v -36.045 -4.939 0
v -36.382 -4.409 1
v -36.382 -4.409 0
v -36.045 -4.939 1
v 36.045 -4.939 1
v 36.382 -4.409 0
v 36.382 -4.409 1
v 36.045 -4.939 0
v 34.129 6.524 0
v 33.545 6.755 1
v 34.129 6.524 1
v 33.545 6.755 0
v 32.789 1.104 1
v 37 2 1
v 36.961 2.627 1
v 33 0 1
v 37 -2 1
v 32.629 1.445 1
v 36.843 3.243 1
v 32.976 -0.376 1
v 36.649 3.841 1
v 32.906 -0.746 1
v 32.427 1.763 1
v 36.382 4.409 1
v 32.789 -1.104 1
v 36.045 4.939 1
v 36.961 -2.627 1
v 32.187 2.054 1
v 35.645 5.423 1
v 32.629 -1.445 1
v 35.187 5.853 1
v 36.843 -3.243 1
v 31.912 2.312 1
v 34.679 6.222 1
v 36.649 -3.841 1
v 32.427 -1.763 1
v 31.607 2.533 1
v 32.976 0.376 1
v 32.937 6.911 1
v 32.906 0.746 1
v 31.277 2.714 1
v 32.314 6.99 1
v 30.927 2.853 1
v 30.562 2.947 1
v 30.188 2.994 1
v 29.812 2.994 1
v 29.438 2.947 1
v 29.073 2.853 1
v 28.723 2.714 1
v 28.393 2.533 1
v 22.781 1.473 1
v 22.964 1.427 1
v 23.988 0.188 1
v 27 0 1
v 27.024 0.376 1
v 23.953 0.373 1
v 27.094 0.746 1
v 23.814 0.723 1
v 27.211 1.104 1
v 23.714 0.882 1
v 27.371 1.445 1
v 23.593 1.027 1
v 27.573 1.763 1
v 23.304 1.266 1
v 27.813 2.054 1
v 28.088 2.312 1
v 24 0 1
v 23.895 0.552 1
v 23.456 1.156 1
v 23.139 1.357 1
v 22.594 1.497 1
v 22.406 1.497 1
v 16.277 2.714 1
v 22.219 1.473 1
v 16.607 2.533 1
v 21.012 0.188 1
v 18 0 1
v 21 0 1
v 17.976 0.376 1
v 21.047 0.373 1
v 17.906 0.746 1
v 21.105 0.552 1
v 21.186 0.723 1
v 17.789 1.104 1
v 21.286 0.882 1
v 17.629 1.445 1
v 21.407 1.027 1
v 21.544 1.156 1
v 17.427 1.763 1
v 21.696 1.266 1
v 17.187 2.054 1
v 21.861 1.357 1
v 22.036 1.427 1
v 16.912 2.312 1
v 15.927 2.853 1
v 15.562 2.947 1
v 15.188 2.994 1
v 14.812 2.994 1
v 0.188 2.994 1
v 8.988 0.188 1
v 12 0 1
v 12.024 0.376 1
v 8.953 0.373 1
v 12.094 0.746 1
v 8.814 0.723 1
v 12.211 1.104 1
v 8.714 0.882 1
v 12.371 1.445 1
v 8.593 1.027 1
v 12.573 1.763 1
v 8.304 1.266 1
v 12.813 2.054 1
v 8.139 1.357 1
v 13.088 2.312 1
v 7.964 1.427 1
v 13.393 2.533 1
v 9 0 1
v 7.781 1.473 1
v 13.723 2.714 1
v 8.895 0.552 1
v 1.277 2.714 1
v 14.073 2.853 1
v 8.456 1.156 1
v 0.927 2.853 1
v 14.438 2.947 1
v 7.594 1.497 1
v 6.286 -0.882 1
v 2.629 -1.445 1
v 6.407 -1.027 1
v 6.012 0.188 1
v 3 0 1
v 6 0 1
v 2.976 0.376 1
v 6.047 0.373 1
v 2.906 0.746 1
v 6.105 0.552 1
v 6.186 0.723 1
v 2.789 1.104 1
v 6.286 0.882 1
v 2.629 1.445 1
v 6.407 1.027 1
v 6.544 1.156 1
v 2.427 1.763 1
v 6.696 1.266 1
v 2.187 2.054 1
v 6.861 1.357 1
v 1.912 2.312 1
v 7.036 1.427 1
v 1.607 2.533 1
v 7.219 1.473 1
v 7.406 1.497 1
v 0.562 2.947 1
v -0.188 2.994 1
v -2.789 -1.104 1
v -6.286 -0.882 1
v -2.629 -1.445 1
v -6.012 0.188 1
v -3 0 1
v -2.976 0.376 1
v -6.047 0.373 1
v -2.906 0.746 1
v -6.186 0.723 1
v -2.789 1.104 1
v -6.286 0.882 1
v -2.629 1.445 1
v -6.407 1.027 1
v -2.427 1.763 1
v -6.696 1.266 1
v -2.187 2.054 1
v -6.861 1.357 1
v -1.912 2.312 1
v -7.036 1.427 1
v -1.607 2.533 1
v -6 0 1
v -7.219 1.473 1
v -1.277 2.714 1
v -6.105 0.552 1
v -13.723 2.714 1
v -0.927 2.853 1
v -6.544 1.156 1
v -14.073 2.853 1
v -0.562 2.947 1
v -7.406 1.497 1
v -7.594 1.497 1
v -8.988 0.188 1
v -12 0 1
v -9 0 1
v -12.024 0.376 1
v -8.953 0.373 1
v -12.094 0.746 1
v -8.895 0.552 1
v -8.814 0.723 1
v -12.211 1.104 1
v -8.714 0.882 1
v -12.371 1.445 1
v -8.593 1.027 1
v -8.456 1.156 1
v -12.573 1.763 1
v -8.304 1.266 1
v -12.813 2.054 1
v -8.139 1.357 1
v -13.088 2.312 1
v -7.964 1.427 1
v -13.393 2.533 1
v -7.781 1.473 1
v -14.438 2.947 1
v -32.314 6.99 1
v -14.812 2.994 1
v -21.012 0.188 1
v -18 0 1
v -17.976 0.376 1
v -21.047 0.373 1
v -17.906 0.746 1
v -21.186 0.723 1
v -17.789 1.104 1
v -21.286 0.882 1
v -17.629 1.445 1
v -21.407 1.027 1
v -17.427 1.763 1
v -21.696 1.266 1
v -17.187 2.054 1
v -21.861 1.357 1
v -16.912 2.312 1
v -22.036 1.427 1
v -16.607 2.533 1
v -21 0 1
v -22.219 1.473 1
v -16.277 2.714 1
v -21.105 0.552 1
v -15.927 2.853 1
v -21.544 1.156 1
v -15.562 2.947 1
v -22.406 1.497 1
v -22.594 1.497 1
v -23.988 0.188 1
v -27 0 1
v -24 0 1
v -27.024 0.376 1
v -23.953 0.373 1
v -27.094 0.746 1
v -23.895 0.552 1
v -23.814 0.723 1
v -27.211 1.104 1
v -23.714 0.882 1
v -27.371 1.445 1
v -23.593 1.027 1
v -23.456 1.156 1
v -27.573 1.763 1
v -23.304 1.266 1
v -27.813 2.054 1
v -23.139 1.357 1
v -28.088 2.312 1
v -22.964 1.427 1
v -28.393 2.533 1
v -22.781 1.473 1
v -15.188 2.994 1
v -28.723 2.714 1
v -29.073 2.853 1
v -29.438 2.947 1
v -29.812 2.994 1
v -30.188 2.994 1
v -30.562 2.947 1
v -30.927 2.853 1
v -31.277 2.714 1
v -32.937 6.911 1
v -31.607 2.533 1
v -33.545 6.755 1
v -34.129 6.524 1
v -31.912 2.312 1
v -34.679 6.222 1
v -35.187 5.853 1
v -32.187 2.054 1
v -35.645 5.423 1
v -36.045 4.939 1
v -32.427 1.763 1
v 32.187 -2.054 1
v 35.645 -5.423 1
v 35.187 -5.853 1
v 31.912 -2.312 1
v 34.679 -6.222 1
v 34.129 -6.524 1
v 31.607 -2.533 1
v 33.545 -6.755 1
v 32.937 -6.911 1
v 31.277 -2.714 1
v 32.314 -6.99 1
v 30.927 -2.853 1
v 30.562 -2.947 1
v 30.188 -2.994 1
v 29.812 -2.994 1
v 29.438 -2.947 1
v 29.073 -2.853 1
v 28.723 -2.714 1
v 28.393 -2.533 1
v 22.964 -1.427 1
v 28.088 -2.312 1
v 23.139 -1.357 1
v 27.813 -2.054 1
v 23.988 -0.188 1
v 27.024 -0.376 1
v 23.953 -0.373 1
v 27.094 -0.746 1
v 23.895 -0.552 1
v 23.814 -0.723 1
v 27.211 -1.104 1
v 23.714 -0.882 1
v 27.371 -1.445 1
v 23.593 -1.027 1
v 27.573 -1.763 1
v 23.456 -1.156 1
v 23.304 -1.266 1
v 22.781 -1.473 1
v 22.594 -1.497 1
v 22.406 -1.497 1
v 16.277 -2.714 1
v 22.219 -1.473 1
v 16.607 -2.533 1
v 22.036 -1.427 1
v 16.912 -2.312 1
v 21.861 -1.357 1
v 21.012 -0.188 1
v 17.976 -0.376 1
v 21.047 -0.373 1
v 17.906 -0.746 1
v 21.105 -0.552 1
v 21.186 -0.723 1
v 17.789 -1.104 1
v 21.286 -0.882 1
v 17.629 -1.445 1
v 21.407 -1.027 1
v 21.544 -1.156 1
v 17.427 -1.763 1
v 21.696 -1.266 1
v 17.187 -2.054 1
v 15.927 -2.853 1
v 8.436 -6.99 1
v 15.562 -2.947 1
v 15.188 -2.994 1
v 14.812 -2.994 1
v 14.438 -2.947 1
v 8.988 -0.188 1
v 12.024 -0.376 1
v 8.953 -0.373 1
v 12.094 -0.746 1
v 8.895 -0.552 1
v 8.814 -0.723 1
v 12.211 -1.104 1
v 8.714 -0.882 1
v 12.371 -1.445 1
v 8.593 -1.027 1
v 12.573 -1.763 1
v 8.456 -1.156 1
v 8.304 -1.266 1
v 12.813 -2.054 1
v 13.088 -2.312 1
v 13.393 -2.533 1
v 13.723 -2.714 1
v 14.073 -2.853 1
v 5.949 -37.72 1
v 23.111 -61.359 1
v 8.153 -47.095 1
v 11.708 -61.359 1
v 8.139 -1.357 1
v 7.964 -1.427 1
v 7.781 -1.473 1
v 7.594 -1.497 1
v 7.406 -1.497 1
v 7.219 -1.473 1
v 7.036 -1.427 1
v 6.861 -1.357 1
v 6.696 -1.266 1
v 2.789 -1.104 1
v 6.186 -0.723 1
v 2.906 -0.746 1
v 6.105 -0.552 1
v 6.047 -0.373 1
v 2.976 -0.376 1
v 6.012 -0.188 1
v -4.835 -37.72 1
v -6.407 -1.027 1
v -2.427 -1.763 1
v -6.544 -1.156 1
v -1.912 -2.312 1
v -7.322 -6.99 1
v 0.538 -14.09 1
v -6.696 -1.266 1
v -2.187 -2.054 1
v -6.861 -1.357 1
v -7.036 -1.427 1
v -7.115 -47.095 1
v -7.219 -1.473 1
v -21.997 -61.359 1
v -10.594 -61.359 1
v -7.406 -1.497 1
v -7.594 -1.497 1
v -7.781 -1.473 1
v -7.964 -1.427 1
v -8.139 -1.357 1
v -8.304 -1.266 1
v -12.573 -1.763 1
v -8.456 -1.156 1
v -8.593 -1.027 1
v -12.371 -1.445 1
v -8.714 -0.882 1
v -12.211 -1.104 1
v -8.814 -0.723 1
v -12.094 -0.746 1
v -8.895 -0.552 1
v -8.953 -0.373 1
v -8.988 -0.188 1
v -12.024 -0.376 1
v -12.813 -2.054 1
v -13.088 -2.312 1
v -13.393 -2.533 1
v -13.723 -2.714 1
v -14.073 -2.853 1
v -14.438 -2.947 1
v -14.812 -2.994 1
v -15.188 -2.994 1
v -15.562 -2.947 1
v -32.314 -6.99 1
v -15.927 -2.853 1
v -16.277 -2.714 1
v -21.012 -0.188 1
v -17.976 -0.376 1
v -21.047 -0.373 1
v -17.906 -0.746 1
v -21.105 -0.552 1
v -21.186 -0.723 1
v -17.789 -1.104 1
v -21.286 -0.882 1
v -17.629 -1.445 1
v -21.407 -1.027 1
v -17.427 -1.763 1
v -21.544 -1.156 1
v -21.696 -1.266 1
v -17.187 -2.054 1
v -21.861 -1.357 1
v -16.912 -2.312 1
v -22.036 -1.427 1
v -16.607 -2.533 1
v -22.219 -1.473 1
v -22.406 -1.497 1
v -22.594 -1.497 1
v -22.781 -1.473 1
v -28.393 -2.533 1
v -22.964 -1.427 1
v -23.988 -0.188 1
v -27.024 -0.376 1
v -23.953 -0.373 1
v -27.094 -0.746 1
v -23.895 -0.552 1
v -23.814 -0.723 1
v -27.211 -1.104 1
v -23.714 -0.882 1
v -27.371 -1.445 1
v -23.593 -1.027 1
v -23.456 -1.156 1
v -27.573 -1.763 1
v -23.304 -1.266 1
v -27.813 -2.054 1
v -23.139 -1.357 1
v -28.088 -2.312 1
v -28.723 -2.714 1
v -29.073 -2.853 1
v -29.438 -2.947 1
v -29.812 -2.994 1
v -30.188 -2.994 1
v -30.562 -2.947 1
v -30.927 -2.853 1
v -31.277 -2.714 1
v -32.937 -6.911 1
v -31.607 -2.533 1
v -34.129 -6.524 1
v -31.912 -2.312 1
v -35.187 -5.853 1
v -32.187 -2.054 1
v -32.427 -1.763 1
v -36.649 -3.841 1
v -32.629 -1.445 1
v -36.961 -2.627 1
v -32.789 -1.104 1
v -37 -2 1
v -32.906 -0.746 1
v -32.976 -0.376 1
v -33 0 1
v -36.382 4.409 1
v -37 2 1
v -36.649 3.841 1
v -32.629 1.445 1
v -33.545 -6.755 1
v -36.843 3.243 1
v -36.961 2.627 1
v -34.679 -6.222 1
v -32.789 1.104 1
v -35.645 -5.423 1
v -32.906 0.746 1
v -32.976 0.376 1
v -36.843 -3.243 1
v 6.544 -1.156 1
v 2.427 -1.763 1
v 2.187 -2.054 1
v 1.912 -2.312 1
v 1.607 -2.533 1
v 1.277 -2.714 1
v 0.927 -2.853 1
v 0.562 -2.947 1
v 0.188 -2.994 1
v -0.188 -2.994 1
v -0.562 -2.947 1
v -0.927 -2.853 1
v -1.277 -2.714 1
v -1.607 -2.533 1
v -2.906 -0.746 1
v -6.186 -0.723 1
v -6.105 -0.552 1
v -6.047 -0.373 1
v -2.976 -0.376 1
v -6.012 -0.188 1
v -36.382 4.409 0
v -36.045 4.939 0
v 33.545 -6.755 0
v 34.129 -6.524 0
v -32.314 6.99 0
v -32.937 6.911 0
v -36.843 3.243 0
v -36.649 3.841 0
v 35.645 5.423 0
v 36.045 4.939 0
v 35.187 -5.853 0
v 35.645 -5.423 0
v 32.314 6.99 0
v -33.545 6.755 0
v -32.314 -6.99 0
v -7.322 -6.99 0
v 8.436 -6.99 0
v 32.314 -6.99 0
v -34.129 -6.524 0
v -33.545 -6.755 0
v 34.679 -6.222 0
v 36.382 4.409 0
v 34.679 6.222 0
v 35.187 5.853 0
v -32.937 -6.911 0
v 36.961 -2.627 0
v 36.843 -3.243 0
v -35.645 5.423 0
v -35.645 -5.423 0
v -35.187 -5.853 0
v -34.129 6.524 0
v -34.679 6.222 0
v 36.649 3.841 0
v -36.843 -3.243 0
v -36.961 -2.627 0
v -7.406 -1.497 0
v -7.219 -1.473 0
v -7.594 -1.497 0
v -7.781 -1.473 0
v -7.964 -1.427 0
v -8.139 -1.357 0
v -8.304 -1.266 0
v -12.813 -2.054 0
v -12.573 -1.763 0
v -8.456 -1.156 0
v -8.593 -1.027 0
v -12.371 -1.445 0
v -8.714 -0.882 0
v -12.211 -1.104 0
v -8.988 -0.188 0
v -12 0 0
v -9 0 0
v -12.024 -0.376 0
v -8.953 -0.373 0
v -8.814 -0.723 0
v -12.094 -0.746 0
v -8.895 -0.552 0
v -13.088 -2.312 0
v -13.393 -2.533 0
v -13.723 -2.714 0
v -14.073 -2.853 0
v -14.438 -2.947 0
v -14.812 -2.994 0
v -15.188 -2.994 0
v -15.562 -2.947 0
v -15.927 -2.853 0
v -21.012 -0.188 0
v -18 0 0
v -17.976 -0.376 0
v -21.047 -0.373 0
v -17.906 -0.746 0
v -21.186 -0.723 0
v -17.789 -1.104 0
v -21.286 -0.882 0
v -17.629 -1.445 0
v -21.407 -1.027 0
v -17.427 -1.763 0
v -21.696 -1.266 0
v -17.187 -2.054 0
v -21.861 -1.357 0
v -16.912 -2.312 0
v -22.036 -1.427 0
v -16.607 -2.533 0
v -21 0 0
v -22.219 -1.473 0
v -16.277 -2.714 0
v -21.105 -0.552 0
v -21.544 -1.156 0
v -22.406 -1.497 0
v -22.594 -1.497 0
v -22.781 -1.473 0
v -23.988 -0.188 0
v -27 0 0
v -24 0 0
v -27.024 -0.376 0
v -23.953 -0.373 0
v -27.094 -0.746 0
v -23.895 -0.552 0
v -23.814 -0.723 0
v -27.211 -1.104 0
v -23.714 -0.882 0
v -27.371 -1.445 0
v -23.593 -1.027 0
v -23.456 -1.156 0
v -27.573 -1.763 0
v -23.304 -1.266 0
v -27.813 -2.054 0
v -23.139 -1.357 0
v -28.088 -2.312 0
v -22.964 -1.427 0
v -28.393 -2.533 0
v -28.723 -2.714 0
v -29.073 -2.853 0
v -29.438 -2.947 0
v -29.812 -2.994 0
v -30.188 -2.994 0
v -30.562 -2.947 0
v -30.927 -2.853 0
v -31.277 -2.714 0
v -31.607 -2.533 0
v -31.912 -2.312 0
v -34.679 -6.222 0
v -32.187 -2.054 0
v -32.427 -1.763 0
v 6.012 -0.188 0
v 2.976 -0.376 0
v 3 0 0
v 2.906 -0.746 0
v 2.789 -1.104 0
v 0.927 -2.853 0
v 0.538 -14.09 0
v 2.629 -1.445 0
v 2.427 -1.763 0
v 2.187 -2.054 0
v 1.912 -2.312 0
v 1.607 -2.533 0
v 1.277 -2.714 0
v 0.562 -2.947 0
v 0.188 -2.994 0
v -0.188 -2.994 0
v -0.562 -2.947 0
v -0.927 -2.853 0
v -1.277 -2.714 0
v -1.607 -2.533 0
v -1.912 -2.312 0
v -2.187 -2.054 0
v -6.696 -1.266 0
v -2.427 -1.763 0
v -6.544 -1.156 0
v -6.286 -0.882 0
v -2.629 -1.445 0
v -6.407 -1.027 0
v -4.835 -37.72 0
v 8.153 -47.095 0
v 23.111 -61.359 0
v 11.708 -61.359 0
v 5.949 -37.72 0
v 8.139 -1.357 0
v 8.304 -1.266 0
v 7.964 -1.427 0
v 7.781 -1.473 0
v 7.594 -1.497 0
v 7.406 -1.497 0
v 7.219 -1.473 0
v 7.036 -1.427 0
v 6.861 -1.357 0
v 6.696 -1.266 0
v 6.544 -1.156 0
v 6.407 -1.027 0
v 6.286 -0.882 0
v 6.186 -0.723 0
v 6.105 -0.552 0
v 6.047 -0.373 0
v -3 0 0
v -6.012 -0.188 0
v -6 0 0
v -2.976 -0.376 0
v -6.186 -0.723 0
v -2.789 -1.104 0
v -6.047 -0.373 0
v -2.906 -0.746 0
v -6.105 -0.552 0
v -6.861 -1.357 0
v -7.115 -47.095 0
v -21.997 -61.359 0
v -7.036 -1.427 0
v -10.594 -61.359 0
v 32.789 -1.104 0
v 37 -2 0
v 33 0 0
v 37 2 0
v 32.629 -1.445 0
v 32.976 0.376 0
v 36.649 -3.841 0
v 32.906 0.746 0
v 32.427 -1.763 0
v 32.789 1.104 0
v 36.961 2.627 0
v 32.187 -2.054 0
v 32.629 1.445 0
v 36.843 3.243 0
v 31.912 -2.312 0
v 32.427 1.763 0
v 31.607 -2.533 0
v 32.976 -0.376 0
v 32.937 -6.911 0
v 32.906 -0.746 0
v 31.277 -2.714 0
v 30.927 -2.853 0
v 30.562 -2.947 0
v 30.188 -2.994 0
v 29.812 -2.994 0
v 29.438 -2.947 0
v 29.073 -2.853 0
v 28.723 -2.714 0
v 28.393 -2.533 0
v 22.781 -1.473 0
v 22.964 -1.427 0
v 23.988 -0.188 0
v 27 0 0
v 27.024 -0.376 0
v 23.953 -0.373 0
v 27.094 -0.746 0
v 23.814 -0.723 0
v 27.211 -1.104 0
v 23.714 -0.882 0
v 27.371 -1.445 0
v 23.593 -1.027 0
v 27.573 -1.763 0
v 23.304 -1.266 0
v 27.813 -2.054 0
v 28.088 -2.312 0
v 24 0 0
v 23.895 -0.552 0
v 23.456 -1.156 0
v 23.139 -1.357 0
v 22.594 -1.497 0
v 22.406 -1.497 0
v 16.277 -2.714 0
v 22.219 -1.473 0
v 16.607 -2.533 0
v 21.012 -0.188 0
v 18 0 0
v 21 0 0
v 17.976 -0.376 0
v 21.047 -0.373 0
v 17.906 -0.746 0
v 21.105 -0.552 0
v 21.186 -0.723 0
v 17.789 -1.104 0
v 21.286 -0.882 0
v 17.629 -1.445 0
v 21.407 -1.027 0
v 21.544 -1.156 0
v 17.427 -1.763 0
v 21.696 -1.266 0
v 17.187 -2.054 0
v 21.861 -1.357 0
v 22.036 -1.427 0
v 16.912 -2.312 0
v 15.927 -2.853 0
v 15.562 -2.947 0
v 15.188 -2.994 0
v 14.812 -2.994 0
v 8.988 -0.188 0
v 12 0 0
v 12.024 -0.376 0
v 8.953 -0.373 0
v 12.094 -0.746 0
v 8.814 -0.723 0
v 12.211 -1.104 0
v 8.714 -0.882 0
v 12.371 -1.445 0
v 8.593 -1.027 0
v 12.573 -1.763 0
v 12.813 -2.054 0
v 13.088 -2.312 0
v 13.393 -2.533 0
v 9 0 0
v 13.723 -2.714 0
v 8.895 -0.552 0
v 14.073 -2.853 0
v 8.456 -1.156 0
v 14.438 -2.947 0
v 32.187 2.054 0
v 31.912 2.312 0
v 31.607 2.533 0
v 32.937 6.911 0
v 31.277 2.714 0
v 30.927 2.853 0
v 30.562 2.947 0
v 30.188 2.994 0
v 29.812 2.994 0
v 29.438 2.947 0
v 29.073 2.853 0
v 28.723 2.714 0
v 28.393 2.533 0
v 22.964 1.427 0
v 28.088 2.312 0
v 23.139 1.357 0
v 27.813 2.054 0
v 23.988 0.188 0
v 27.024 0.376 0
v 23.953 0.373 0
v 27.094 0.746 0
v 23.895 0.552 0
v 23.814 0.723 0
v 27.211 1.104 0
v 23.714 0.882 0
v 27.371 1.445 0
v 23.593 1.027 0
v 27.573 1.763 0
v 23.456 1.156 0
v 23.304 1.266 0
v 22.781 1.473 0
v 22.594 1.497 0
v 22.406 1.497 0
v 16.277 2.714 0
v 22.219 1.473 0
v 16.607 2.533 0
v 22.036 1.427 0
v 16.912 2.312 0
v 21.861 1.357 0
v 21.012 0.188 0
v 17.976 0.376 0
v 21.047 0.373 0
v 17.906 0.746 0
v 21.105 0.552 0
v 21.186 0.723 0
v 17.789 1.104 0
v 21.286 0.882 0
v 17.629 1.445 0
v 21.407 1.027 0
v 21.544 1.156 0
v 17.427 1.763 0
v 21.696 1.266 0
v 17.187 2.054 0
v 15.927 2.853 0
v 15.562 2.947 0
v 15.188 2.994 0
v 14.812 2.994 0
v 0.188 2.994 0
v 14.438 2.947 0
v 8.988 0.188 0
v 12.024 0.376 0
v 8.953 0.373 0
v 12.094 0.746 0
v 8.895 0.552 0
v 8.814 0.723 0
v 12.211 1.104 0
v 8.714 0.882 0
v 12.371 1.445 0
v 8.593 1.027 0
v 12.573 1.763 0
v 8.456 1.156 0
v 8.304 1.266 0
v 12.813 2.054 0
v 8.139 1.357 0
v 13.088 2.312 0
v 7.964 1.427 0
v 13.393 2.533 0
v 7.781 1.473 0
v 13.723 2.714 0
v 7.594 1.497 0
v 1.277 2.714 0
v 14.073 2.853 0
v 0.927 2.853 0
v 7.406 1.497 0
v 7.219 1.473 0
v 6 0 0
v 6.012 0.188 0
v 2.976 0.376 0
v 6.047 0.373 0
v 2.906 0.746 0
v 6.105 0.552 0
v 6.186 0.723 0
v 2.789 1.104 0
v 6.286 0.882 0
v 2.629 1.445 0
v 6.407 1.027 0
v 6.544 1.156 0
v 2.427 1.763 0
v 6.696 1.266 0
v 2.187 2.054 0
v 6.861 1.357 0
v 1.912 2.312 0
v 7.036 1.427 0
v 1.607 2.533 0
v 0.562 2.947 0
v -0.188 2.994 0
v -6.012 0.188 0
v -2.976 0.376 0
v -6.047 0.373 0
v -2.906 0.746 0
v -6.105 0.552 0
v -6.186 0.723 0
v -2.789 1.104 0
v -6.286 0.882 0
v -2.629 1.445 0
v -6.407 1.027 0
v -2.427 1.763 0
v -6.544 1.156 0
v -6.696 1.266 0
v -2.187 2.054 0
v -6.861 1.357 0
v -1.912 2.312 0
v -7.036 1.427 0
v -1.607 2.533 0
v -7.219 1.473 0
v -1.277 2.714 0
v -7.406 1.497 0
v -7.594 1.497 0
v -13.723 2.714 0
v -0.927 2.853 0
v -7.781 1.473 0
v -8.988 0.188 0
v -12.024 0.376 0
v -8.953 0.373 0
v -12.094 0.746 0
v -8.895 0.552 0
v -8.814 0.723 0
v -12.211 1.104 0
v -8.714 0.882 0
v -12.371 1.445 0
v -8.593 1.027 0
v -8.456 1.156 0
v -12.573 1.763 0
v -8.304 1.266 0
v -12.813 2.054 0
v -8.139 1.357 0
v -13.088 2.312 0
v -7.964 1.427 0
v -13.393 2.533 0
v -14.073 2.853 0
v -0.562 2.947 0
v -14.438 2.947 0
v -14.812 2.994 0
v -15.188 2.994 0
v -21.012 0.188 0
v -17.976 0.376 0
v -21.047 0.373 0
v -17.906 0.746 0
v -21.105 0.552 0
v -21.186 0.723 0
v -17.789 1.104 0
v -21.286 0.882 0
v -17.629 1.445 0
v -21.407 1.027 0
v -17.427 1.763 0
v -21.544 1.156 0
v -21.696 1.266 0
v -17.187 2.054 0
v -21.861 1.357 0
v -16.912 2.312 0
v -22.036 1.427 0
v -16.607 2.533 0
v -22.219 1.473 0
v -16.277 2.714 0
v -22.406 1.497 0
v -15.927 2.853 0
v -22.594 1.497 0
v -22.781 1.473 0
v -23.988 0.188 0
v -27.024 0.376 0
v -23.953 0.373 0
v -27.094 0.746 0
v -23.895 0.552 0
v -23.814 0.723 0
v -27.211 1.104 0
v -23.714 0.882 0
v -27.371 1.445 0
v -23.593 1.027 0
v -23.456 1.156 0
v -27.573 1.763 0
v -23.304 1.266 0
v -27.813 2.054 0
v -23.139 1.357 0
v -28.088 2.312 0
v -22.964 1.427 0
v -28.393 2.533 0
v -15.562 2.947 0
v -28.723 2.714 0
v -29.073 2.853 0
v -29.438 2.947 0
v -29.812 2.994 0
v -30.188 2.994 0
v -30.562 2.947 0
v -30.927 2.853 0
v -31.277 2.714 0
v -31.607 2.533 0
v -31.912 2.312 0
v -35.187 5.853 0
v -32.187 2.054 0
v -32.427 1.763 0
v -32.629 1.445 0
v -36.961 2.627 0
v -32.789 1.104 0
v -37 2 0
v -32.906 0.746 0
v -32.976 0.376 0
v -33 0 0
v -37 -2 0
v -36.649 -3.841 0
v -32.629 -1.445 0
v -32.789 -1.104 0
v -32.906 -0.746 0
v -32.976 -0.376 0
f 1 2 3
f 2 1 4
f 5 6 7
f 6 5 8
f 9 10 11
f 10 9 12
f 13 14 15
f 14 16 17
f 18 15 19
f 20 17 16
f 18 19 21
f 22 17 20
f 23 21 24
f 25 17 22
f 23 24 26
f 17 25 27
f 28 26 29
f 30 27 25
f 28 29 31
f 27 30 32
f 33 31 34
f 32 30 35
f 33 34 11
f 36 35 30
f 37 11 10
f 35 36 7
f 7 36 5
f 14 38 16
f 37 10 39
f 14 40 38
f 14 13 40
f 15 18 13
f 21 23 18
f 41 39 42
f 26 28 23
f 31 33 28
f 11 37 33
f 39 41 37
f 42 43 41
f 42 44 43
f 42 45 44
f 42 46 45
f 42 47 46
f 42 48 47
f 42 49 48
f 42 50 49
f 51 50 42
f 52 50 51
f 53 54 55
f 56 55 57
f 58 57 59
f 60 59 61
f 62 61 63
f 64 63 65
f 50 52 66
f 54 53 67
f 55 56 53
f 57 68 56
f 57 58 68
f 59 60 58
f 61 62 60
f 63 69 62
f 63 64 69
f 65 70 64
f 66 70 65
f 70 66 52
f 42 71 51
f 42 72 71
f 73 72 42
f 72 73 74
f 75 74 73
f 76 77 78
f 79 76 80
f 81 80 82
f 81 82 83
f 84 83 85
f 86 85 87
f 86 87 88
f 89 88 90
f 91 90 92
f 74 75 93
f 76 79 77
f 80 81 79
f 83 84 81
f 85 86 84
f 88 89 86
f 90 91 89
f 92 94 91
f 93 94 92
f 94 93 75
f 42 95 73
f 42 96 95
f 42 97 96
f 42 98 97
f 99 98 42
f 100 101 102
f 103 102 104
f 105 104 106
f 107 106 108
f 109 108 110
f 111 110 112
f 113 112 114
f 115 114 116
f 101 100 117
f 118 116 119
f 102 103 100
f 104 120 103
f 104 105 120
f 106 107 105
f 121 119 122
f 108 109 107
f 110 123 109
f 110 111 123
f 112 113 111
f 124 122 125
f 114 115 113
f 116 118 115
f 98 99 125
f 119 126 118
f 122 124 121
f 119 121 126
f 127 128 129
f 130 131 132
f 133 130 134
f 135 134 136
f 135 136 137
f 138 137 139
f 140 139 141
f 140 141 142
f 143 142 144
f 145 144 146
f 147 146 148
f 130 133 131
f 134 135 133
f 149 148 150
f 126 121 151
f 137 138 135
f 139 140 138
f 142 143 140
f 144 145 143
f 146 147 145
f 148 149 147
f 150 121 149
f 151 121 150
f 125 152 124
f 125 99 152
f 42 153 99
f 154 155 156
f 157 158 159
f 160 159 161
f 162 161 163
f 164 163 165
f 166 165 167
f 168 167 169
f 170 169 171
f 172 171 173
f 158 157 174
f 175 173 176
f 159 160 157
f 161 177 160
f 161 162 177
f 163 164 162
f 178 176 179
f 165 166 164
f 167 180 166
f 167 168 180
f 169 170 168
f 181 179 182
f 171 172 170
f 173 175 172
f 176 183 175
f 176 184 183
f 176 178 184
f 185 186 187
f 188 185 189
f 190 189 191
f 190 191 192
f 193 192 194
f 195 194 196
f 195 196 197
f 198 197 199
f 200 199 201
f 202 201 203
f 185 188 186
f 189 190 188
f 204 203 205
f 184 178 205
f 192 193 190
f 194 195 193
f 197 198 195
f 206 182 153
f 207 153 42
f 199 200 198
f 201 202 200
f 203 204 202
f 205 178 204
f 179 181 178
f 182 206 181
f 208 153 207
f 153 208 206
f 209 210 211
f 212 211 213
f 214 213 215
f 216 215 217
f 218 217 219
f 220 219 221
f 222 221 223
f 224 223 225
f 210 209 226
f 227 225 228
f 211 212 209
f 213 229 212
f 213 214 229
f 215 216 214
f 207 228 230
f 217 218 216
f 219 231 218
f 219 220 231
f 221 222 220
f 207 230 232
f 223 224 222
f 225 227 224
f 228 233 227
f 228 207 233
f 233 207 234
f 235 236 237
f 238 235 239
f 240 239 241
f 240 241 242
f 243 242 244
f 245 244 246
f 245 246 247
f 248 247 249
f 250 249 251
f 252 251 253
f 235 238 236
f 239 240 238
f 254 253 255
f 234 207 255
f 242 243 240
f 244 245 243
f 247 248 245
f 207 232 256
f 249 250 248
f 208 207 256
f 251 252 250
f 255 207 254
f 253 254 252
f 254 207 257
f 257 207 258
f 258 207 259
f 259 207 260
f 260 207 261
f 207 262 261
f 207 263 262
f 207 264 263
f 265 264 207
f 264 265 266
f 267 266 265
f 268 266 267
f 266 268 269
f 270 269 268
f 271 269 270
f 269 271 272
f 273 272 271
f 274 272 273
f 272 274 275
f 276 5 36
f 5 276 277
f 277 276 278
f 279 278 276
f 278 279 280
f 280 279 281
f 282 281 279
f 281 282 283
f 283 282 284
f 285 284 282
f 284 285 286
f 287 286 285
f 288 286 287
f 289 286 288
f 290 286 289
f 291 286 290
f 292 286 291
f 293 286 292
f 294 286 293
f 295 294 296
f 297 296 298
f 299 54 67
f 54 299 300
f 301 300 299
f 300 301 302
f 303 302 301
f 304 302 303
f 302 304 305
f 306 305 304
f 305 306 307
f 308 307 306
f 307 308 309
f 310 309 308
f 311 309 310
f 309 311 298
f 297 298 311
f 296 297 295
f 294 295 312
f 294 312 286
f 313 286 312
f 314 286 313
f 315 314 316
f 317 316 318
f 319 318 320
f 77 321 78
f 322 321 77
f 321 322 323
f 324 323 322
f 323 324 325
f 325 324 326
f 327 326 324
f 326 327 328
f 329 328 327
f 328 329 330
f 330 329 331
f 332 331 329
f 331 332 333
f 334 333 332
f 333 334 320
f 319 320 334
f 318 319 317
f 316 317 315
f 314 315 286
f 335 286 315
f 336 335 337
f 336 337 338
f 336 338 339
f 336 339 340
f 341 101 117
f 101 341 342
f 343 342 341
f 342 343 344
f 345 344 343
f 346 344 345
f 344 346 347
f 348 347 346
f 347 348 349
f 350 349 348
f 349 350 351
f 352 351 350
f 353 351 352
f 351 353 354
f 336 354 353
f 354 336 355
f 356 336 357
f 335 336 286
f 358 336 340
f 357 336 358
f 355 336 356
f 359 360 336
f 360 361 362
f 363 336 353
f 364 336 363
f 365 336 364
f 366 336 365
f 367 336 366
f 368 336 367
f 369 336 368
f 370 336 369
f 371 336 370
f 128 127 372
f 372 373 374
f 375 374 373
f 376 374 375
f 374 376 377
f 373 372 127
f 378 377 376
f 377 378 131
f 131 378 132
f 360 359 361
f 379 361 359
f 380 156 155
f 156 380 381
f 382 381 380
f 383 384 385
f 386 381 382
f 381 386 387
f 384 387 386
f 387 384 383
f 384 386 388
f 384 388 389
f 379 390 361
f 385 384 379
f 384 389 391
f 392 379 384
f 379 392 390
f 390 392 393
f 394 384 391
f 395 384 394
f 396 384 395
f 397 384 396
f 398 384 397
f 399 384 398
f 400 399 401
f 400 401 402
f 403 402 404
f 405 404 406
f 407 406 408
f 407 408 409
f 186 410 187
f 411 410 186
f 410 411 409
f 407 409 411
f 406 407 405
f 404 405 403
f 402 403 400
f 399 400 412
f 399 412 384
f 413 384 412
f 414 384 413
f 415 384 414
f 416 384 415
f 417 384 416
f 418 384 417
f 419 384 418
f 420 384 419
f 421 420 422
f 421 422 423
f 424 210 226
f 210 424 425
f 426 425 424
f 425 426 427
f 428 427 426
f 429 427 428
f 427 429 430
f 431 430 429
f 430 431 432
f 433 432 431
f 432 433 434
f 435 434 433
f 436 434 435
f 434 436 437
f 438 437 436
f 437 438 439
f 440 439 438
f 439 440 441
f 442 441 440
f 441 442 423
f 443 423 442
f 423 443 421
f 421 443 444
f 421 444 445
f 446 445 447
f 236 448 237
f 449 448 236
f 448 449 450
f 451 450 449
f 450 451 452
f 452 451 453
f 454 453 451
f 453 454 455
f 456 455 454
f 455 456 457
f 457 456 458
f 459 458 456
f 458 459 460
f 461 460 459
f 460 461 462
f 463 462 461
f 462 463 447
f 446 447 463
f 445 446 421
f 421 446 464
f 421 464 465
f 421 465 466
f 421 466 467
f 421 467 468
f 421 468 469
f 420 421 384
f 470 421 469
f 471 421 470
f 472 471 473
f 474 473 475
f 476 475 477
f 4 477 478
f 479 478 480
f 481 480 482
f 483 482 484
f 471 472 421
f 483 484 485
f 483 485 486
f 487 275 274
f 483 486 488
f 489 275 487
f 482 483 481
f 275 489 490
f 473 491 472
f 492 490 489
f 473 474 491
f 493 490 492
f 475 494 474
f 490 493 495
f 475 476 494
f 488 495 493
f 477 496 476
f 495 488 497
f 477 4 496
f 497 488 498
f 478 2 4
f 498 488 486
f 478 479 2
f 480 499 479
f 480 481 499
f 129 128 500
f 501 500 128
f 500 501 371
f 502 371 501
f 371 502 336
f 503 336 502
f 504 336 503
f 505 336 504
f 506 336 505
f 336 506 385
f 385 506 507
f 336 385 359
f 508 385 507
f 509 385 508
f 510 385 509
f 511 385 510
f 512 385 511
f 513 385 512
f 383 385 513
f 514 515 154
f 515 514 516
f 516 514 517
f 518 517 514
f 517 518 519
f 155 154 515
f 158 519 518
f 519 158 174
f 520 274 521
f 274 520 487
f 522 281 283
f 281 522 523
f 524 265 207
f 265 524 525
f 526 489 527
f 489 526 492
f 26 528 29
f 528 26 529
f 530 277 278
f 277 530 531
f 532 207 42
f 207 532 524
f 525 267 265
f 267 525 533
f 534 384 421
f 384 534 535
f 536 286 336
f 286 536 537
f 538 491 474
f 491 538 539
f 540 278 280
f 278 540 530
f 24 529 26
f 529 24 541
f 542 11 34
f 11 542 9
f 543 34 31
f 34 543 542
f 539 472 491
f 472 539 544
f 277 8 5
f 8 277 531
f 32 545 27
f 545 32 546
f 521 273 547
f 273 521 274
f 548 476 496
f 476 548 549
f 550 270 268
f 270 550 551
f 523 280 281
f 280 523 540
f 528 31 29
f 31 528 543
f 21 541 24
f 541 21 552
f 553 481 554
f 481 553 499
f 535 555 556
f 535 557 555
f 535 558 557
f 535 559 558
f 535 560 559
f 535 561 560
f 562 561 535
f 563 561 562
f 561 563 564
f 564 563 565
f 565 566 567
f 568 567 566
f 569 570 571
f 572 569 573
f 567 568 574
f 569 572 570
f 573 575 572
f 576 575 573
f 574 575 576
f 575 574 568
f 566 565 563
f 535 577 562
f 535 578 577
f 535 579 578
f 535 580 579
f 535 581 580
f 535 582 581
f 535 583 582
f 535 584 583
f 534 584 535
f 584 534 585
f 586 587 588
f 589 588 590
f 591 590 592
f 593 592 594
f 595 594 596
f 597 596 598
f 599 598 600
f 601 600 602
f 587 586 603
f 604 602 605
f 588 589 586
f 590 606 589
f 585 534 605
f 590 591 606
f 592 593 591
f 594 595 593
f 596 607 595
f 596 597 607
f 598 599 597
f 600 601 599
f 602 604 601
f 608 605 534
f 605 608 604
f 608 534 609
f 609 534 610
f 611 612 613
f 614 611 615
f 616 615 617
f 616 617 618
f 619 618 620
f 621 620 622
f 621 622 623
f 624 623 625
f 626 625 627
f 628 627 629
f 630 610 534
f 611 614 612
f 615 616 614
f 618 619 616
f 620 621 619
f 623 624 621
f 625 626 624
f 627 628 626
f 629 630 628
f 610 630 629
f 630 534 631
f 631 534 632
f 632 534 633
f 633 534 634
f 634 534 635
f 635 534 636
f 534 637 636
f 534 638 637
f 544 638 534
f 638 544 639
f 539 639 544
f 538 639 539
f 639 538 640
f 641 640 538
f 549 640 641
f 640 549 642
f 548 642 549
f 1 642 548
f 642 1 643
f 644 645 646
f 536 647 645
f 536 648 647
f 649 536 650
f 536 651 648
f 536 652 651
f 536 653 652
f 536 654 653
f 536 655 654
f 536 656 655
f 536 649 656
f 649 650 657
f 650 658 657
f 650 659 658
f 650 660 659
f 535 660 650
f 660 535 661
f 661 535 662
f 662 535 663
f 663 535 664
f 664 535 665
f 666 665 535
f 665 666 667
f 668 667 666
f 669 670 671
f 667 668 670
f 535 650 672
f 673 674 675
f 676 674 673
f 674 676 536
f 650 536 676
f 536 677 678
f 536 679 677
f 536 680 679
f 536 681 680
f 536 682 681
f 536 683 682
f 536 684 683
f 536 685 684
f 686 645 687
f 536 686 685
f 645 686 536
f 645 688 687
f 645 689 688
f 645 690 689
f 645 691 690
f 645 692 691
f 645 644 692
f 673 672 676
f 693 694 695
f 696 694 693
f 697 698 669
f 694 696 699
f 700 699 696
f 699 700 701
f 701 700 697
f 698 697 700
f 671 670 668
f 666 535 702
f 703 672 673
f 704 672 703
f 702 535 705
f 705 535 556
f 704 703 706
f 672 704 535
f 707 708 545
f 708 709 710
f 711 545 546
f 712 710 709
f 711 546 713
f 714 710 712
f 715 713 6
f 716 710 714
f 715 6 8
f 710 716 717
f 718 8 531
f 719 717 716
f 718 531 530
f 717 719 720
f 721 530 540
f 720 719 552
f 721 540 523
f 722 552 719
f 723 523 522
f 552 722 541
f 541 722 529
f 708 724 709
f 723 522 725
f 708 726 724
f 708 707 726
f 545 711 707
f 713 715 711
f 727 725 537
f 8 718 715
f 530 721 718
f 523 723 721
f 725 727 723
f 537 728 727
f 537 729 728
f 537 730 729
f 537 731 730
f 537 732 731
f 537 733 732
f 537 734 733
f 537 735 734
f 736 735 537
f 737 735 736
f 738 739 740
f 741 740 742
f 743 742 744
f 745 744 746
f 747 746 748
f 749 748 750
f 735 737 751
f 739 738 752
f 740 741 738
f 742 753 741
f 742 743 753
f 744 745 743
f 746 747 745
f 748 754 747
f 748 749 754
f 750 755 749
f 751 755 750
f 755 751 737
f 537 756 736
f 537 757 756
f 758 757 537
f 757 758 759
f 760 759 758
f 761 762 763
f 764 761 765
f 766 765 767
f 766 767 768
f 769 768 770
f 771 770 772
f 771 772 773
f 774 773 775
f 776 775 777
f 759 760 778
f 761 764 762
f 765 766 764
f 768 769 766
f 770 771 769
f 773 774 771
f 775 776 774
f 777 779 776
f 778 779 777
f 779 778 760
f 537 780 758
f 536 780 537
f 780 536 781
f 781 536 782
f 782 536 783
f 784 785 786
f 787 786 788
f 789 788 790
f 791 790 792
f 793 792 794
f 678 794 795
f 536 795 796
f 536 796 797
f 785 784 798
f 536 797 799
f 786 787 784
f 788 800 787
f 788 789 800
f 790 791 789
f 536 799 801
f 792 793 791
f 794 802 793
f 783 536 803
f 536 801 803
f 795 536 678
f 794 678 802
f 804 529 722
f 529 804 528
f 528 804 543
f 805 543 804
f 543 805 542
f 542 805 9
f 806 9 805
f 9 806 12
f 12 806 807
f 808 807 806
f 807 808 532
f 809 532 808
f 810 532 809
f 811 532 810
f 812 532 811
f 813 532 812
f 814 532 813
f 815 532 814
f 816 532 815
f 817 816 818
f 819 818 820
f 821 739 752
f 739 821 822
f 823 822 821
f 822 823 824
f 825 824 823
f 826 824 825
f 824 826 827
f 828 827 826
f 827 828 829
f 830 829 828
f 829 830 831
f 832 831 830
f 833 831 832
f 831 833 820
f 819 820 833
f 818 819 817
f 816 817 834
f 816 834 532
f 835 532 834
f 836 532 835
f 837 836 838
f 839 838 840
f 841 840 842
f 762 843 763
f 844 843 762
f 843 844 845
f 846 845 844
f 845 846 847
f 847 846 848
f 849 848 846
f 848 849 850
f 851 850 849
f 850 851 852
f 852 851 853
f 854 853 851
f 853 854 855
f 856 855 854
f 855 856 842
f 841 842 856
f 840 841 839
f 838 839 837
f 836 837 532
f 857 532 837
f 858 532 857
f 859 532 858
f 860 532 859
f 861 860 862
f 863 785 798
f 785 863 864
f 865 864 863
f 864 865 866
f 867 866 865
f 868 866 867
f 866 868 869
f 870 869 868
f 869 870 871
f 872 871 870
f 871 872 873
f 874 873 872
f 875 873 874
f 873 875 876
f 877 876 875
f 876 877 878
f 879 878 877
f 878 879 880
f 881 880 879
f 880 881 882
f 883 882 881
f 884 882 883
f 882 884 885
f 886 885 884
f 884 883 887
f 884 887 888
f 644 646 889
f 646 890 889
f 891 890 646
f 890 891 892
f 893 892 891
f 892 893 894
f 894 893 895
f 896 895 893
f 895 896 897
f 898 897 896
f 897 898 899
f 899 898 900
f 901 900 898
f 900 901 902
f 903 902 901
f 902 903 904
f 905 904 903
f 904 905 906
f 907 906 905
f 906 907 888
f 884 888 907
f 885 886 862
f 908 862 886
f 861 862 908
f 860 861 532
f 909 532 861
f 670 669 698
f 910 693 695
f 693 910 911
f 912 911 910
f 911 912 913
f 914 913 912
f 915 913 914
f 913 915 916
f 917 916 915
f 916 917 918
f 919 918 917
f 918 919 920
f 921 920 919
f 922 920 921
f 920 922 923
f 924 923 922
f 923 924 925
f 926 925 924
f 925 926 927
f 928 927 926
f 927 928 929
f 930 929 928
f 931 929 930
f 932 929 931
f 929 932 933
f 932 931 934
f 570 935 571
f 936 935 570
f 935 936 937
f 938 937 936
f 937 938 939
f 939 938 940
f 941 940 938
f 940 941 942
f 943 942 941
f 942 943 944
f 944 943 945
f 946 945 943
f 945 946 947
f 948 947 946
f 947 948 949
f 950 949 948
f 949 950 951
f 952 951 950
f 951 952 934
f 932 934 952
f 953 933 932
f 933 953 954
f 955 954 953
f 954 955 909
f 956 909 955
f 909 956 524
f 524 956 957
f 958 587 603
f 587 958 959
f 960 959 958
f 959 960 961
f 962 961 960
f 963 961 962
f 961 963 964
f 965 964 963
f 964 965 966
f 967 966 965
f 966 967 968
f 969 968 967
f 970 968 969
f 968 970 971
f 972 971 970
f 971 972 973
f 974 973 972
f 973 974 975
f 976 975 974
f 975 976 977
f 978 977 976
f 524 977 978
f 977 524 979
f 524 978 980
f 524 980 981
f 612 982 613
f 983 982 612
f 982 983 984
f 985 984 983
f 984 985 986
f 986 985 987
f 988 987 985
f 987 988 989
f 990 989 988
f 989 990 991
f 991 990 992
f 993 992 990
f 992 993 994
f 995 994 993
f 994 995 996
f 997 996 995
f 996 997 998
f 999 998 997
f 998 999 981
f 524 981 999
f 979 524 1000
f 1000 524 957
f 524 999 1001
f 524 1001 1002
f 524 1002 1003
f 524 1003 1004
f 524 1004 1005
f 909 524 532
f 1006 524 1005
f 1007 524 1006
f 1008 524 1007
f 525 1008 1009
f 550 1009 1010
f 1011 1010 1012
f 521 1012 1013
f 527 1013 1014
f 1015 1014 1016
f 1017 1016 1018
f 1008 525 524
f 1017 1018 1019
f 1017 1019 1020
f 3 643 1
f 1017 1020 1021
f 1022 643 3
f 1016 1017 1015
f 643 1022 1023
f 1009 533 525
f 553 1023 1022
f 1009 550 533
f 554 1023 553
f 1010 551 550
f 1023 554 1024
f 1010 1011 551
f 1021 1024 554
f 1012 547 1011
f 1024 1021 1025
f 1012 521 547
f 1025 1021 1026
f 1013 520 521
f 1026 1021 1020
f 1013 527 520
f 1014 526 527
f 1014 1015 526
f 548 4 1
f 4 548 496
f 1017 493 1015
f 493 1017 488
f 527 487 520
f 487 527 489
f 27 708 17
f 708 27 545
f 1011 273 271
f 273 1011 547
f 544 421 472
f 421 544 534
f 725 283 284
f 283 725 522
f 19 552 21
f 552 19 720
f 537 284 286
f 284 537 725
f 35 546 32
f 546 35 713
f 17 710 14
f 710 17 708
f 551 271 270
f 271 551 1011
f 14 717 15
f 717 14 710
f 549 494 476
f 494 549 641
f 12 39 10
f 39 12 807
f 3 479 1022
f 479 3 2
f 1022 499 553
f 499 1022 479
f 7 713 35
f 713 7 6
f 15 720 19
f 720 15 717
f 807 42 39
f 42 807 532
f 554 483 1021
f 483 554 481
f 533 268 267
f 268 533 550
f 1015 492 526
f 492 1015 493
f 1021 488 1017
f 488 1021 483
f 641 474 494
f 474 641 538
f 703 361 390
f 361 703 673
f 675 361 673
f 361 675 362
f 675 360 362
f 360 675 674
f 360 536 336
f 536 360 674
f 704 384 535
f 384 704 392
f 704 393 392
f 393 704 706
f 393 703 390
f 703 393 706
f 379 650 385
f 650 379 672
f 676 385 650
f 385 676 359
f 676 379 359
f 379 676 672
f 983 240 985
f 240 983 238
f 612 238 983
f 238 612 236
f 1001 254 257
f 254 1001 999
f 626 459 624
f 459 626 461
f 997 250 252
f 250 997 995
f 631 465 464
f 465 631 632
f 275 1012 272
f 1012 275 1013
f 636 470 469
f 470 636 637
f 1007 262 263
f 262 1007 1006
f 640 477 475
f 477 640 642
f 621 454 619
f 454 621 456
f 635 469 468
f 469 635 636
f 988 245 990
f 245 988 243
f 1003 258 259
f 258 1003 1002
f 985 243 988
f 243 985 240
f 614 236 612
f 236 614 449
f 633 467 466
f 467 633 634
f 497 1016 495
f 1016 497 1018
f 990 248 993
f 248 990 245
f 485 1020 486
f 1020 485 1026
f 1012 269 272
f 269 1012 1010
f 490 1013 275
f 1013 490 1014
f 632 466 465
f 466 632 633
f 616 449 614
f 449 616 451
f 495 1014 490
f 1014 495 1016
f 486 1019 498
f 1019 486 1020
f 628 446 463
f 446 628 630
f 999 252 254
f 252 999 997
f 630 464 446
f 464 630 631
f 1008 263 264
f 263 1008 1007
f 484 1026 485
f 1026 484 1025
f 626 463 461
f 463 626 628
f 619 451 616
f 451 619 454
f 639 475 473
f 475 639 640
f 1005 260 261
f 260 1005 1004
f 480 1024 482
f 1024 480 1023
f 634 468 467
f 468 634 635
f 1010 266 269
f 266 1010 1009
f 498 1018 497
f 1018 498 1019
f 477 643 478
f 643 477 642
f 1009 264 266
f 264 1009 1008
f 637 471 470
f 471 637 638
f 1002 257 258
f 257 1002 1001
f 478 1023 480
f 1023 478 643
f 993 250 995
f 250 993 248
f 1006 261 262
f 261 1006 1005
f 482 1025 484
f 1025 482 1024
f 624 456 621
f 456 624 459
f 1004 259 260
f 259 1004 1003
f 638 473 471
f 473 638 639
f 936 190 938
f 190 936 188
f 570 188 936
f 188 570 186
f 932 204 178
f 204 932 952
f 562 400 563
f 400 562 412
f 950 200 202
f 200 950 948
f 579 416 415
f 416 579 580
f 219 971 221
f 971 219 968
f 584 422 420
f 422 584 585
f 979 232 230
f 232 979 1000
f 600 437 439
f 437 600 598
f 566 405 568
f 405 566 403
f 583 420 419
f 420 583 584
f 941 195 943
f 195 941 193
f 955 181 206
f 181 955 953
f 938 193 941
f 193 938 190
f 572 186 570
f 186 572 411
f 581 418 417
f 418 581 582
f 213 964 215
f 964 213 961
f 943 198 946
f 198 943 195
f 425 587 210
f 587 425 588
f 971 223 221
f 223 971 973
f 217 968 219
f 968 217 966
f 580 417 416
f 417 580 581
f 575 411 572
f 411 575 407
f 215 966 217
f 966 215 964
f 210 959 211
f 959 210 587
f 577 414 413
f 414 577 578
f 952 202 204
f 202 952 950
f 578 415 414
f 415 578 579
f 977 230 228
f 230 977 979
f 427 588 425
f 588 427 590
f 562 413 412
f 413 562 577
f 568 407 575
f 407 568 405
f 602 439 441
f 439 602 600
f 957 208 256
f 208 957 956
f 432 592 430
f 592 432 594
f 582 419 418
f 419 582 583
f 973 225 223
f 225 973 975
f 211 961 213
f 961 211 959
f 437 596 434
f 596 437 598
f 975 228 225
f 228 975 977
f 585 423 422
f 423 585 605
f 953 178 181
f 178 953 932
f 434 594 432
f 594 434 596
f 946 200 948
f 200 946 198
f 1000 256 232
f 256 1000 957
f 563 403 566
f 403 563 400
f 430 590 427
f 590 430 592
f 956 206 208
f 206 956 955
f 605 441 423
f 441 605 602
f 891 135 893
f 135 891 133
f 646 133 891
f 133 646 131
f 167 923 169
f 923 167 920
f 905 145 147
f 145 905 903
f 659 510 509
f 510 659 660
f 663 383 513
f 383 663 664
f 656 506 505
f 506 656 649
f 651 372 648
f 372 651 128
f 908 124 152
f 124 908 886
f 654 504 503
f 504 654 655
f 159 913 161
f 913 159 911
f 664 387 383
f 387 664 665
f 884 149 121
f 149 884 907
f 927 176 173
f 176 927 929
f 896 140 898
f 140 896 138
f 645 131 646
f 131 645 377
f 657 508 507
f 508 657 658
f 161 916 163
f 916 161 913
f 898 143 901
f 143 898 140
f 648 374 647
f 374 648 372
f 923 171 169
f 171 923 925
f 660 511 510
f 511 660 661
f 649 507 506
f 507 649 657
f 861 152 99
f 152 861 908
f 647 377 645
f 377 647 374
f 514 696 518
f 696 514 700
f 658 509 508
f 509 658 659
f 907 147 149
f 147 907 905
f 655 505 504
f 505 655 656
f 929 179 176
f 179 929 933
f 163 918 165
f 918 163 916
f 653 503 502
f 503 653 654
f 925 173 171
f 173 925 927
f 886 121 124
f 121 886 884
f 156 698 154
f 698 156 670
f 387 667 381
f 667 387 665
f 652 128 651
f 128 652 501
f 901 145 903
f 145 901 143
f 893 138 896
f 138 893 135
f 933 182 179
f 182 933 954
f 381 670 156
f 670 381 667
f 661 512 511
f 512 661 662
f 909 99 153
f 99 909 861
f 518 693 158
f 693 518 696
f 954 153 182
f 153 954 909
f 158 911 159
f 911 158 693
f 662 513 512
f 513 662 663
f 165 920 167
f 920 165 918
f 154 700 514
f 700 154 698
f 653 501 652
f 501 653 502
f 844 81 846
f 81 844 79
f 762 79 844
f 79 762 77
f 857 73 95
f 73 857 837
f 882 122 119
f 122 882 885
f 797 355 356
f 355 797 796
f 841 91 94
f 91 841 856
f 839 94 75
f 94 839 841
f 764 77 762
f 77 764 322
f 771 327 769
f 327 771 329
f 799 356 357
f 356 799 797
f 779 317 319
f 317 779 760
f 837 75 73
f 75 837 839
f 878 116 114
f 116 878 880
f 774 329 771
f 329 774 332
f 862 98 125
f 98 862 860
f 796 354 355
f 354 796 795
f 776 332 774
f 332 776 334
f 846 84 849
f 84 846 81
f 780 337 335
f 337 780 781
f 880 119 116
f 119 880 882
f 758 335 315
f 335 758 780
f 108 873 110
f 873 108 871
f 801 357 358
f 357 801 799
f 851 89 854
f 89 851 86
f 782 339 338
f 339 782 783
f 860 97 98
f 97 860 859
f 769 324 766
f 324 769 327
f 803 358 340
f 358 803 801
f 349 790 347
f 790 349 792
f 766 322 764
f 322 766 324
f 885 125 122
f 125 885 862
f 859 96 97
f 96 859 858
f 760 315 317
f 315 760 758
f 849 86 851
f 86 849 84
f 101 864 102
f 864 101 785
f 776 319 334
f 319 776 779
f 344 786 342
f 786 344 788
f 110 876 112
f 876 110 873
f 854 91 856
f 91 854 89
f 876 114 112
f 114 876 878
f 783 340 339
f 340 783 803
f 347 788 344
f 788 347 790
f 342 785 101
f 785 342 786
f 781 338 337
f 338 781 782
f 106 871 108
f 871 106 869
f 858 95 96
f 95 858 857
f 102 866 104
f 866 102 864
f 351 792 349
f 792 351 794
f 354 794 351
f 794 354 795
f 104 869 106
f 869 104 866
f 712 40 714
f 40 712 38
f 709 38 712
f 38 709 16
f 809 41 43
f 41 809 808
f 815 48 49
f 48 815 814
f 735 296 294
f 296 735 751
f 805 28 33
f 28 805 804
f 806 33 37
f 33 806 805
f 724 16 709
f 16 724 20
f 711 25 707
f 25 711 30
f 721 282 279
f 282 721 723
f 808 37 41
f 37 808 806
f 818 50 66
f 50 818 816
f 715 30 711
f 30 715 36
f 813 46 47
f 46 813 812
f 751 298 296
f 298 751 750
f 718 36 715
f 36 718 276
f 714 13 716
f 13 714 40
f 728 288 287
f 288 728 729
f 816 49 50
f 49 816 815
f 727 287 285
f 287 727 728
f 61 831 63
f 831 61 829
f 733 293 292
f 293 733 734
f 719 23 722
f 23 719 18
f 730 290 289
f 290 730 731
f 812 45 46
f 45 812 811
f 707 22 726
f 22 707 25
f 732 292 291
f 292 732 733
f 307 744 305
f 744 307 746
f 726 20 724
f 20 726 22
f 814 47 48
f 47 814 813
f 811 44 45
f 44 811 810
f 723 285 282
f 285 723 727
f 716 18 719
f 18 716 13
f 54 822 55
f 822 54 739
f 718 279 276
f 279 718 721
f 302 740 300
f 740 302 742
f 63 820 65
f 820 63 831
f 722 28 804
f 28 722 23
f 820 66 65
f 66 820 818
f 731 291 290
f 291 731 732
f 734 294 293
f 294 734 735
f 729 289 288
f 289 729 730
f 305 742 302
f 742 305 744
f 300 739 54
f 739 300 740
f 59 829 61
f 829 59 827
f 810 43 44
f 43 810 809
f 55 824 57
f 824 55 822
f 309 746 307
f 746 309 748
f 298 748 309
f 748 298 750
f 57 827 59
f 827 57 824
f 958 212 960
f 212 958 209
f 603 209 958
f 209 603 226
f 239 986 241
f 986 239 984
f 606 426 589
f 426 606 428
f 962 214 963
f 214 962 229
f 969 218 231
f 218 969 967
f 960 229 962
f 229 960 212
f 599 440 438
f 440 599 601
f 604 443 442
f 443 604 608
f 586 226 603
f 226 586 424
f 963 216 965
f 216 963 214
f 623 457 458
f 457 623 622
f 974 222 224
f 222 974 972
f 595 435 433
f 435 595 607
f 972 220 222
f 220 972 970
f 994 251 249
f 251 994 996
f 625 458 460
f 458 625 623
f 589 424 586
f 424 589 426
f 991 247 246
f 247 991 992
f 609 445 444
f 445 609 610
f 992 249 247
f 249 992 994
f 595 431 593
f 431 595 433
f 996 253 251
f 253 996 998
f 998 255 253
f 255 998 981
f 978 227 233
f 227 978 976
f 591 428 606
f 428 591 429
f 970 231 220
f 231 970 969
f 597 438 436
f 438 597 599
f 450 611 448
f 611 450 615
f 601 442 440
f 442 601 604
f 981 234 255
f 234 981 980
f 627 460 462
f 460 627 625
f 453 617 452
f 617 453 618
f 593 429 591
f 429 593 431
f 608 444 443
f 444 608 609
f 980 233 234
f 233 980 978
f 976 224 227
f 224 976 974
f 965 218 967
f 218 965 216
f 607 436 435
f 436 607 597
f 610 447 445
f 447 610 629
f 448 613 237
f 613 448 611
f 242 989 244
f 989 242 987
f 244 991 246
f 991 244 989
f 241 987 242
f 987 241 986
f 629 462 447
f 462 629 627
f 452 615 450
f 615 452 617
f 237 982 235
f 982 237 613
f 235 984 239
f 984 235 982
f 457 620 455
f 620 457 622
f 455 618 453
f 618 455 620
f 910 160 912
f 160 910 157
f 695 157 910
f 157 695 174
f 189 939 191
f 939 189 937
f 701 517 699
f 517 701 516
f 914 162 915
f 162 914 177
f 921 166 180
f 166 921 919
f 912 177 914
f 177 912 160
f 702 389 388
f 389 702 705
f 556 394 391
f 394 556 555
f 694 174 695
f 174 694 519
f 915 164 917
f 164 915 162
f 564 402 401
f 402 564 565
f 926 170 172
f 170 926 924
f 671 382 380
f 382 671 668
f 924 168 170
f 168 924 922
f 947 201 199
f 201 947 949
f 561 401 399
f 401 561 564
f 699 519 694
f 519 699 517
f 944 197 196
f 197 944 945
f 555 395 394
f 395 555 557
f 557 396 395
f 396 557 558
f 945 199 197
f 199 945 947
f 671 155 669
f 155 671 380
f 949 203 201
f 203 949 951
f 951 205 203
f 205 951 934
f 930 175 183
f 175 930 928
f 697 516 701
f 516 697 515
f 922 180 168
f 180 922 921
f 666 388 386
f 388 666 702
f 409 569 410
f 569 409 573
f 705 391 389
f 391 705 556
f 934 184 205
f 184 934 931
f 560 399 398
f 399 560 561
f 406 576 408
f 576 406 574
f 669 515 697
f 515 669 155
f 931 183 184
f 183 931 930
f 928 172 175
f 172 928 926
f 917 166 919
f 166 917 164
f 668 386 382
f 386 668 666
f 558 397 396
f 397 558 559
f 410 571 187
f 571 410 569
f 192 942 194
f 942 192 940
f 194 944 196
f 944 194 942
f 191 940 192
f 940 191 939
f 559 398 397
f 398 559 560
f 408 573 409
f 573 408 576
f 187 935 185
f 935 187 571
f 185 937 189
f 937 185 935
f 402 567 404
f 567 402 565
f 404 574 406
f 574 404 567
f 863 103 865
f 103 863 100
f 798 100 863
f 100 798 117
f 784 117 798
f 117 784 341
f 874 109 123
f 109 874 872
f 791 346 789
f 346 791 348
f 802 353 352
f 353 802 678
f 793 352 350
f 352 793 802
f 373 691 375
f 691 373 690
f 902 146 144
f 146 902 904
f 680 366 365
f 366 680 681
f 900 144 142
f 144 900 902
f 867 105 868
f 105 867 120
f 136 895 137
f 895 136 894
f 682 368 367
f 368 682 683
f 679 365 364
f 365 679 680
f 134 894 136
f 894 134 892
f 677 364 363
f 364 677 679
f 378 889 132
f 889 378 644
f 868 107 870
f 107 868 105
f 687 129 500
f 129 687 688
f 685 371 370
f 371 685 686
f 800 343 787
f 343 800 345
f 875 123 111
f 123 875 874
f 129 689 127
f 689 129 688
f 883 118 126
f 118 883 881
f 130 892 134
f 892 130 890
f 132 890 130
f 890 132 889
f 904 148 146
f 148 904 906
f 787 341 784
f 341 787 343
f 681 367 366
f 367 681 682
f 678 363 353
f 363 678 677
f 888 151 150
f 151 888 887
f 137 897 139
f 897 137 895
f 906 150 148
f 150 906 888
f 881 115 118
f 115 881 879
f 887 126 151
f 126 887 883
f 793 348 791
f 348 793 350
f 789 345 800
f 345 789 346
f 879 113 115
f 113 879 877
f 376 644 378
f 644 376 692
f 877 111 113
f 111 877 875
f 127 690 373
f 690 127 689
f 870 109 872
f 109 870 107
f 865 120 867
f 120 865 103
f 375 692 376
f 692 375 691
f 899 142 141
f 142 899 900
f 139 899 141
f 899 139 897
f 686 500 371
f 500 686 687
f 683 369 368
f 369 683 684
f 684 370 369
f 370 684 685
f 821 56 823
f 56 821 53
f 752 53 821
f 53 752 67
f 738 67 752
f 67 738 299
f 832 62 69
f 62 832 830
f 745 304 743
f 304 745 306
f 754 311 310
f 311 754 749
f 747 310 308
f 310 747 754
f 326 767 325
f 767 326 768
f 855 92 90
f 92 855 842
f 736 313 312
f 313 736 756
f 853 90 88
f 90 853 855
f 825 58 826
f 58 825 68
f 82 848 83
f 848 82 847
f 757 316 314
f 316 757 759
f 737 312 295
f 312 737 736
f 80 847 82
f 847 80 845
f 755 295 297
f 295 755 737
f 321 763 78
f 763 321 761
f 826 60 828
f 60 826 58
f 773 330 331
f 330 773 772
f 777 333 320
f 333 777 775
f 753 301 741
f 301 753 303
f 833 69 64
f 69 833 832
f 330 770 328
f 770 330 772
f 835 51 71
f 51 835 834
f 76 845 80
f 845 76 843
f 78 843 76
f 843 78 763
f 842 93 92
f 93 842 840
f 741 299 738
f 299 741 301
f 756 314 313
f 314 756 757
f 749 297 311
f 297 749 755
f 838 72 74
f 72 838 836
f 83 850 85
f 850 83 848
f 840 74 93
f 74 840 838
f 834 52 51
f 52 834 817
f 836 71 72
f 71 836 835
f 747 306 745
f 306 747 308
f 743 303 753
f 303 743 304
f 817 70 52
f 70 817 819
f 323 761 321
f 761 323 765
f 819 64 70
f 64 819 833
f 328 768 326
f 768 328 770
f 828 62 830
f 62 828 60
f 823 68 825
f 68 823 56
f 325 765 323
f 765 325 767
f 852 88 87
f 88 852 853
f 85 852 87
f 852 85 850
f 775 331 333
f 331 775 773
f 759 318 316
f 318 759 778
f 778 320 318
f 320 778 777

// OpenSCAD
$fn = 50;


difference() {
	union() {
		hull() {
			translate(v = [-32.0000000000, 2.0000000000, 0]) {
				cylinder(h = 1, r = 5);
			}
			translate(v = [32.0000000000, 2.0000000000, 0]) {
				cylinder(h = 1, r = 5);
			}
			translate(v = [-32.0000000000, -2.0000000000, 0]) {
				cylinder(h = 1, r = 5);
			}
			translate(v = [32.0000000000, -2.0000000000, 0]) {
				cylinder(h = 1, r = 5);
			}
		}
		translate(v = [0, -5, 0]) {
			linear_extrude(height = 1) {
				text(font = "DejaVu Sans Mono:style=Bold", halign = "center", size = 57.0000000000, text = "A", valign = "top");
			}
		}
	}
	union() {
		translate(v = [-30.0000000000, 0.0000000000, 0]) {
			translate(v = [0, 0, -100]) {
				cylinder(h = 200, r = 3.0000000000);
			}
		}
		translate(v = [-15.0000000000, 0.0000000000, 0]) {
			translate(v = [0, 0, -100]) {
				cylinder(h = 200, r = 3.0000000000);
			}
		}
		translate(v = [0, 0, -100]) {
			cylinder(h = 200, r = 3.0000000000);
		}
		translate(v = [15.0000000000, 0.0000000000, 0]) {
			translate(v = [0, 0, -100]) {
				cylinder(h = 200, r = 3.0000000000);
			}
		}
		translate(v = [30.0000000000, 0.0000000000, 0]) {
			translate(v = [0, 0, -100]) {
				cylinder(h = 200, r = 3.0000000000);
			}
		}
		translate(v = [-30.0000000000, 0.0000000000, 0]) {
			translate(v = [0, 0, -100]) {
				cylinder(h = 200, r = 1.5000000000);
			}
		}
		translate(v = [-22.5000000000, 0.0000000000, 0]) {
			translate(v = [0, 0, -100]) {
				cylinder(h = 200, r = 1.5000000000);
			}
		}
		translate(v = [-15.0000000000, 0.0000000000, 0]) {
			translate(v = [0, 0, -100]) {
				cylinder(h = 200, r = 1.5000000000);
			}
		}
		translate(v = [-7.5000000000, 0.0000000000, 0]) {
			translate(v = [0, 0, -100]) {
				cylinder(h = 200, r = 1.5000000000);
			}
		}
		translate(v = [0, 0, -100]) {
			cylinder(h = 200, r = 1.5000000000);
		}
		translate(v = [7.5000000000, 0.0000000000, 0]) {
			translate(v = [0, 0, -100]) {
				cylinder(h = 200, r = 1.5000000000);
			}
		}
		translate(v = [15.0000000000, 0.0000000000, 0]) {
			translate(v = [0, 0, -100]) {
				cylinder(h = 200, r = 1.5000000000);
			}
		}
		translate(v = [22.5000000000, 0.0000000000, 0]) {
			translate(v = [0, 0, -100]) {
				cylinder(h = 200, r = 1.5000000000);
			}
		}
		translate(v = [30.0000000000, 0.0000000000, 0]) {
			translate(v = [0, 0, -100]) {
				cylinder(h = 200, r = 1.5000000000);
			}
		}
	}
}
